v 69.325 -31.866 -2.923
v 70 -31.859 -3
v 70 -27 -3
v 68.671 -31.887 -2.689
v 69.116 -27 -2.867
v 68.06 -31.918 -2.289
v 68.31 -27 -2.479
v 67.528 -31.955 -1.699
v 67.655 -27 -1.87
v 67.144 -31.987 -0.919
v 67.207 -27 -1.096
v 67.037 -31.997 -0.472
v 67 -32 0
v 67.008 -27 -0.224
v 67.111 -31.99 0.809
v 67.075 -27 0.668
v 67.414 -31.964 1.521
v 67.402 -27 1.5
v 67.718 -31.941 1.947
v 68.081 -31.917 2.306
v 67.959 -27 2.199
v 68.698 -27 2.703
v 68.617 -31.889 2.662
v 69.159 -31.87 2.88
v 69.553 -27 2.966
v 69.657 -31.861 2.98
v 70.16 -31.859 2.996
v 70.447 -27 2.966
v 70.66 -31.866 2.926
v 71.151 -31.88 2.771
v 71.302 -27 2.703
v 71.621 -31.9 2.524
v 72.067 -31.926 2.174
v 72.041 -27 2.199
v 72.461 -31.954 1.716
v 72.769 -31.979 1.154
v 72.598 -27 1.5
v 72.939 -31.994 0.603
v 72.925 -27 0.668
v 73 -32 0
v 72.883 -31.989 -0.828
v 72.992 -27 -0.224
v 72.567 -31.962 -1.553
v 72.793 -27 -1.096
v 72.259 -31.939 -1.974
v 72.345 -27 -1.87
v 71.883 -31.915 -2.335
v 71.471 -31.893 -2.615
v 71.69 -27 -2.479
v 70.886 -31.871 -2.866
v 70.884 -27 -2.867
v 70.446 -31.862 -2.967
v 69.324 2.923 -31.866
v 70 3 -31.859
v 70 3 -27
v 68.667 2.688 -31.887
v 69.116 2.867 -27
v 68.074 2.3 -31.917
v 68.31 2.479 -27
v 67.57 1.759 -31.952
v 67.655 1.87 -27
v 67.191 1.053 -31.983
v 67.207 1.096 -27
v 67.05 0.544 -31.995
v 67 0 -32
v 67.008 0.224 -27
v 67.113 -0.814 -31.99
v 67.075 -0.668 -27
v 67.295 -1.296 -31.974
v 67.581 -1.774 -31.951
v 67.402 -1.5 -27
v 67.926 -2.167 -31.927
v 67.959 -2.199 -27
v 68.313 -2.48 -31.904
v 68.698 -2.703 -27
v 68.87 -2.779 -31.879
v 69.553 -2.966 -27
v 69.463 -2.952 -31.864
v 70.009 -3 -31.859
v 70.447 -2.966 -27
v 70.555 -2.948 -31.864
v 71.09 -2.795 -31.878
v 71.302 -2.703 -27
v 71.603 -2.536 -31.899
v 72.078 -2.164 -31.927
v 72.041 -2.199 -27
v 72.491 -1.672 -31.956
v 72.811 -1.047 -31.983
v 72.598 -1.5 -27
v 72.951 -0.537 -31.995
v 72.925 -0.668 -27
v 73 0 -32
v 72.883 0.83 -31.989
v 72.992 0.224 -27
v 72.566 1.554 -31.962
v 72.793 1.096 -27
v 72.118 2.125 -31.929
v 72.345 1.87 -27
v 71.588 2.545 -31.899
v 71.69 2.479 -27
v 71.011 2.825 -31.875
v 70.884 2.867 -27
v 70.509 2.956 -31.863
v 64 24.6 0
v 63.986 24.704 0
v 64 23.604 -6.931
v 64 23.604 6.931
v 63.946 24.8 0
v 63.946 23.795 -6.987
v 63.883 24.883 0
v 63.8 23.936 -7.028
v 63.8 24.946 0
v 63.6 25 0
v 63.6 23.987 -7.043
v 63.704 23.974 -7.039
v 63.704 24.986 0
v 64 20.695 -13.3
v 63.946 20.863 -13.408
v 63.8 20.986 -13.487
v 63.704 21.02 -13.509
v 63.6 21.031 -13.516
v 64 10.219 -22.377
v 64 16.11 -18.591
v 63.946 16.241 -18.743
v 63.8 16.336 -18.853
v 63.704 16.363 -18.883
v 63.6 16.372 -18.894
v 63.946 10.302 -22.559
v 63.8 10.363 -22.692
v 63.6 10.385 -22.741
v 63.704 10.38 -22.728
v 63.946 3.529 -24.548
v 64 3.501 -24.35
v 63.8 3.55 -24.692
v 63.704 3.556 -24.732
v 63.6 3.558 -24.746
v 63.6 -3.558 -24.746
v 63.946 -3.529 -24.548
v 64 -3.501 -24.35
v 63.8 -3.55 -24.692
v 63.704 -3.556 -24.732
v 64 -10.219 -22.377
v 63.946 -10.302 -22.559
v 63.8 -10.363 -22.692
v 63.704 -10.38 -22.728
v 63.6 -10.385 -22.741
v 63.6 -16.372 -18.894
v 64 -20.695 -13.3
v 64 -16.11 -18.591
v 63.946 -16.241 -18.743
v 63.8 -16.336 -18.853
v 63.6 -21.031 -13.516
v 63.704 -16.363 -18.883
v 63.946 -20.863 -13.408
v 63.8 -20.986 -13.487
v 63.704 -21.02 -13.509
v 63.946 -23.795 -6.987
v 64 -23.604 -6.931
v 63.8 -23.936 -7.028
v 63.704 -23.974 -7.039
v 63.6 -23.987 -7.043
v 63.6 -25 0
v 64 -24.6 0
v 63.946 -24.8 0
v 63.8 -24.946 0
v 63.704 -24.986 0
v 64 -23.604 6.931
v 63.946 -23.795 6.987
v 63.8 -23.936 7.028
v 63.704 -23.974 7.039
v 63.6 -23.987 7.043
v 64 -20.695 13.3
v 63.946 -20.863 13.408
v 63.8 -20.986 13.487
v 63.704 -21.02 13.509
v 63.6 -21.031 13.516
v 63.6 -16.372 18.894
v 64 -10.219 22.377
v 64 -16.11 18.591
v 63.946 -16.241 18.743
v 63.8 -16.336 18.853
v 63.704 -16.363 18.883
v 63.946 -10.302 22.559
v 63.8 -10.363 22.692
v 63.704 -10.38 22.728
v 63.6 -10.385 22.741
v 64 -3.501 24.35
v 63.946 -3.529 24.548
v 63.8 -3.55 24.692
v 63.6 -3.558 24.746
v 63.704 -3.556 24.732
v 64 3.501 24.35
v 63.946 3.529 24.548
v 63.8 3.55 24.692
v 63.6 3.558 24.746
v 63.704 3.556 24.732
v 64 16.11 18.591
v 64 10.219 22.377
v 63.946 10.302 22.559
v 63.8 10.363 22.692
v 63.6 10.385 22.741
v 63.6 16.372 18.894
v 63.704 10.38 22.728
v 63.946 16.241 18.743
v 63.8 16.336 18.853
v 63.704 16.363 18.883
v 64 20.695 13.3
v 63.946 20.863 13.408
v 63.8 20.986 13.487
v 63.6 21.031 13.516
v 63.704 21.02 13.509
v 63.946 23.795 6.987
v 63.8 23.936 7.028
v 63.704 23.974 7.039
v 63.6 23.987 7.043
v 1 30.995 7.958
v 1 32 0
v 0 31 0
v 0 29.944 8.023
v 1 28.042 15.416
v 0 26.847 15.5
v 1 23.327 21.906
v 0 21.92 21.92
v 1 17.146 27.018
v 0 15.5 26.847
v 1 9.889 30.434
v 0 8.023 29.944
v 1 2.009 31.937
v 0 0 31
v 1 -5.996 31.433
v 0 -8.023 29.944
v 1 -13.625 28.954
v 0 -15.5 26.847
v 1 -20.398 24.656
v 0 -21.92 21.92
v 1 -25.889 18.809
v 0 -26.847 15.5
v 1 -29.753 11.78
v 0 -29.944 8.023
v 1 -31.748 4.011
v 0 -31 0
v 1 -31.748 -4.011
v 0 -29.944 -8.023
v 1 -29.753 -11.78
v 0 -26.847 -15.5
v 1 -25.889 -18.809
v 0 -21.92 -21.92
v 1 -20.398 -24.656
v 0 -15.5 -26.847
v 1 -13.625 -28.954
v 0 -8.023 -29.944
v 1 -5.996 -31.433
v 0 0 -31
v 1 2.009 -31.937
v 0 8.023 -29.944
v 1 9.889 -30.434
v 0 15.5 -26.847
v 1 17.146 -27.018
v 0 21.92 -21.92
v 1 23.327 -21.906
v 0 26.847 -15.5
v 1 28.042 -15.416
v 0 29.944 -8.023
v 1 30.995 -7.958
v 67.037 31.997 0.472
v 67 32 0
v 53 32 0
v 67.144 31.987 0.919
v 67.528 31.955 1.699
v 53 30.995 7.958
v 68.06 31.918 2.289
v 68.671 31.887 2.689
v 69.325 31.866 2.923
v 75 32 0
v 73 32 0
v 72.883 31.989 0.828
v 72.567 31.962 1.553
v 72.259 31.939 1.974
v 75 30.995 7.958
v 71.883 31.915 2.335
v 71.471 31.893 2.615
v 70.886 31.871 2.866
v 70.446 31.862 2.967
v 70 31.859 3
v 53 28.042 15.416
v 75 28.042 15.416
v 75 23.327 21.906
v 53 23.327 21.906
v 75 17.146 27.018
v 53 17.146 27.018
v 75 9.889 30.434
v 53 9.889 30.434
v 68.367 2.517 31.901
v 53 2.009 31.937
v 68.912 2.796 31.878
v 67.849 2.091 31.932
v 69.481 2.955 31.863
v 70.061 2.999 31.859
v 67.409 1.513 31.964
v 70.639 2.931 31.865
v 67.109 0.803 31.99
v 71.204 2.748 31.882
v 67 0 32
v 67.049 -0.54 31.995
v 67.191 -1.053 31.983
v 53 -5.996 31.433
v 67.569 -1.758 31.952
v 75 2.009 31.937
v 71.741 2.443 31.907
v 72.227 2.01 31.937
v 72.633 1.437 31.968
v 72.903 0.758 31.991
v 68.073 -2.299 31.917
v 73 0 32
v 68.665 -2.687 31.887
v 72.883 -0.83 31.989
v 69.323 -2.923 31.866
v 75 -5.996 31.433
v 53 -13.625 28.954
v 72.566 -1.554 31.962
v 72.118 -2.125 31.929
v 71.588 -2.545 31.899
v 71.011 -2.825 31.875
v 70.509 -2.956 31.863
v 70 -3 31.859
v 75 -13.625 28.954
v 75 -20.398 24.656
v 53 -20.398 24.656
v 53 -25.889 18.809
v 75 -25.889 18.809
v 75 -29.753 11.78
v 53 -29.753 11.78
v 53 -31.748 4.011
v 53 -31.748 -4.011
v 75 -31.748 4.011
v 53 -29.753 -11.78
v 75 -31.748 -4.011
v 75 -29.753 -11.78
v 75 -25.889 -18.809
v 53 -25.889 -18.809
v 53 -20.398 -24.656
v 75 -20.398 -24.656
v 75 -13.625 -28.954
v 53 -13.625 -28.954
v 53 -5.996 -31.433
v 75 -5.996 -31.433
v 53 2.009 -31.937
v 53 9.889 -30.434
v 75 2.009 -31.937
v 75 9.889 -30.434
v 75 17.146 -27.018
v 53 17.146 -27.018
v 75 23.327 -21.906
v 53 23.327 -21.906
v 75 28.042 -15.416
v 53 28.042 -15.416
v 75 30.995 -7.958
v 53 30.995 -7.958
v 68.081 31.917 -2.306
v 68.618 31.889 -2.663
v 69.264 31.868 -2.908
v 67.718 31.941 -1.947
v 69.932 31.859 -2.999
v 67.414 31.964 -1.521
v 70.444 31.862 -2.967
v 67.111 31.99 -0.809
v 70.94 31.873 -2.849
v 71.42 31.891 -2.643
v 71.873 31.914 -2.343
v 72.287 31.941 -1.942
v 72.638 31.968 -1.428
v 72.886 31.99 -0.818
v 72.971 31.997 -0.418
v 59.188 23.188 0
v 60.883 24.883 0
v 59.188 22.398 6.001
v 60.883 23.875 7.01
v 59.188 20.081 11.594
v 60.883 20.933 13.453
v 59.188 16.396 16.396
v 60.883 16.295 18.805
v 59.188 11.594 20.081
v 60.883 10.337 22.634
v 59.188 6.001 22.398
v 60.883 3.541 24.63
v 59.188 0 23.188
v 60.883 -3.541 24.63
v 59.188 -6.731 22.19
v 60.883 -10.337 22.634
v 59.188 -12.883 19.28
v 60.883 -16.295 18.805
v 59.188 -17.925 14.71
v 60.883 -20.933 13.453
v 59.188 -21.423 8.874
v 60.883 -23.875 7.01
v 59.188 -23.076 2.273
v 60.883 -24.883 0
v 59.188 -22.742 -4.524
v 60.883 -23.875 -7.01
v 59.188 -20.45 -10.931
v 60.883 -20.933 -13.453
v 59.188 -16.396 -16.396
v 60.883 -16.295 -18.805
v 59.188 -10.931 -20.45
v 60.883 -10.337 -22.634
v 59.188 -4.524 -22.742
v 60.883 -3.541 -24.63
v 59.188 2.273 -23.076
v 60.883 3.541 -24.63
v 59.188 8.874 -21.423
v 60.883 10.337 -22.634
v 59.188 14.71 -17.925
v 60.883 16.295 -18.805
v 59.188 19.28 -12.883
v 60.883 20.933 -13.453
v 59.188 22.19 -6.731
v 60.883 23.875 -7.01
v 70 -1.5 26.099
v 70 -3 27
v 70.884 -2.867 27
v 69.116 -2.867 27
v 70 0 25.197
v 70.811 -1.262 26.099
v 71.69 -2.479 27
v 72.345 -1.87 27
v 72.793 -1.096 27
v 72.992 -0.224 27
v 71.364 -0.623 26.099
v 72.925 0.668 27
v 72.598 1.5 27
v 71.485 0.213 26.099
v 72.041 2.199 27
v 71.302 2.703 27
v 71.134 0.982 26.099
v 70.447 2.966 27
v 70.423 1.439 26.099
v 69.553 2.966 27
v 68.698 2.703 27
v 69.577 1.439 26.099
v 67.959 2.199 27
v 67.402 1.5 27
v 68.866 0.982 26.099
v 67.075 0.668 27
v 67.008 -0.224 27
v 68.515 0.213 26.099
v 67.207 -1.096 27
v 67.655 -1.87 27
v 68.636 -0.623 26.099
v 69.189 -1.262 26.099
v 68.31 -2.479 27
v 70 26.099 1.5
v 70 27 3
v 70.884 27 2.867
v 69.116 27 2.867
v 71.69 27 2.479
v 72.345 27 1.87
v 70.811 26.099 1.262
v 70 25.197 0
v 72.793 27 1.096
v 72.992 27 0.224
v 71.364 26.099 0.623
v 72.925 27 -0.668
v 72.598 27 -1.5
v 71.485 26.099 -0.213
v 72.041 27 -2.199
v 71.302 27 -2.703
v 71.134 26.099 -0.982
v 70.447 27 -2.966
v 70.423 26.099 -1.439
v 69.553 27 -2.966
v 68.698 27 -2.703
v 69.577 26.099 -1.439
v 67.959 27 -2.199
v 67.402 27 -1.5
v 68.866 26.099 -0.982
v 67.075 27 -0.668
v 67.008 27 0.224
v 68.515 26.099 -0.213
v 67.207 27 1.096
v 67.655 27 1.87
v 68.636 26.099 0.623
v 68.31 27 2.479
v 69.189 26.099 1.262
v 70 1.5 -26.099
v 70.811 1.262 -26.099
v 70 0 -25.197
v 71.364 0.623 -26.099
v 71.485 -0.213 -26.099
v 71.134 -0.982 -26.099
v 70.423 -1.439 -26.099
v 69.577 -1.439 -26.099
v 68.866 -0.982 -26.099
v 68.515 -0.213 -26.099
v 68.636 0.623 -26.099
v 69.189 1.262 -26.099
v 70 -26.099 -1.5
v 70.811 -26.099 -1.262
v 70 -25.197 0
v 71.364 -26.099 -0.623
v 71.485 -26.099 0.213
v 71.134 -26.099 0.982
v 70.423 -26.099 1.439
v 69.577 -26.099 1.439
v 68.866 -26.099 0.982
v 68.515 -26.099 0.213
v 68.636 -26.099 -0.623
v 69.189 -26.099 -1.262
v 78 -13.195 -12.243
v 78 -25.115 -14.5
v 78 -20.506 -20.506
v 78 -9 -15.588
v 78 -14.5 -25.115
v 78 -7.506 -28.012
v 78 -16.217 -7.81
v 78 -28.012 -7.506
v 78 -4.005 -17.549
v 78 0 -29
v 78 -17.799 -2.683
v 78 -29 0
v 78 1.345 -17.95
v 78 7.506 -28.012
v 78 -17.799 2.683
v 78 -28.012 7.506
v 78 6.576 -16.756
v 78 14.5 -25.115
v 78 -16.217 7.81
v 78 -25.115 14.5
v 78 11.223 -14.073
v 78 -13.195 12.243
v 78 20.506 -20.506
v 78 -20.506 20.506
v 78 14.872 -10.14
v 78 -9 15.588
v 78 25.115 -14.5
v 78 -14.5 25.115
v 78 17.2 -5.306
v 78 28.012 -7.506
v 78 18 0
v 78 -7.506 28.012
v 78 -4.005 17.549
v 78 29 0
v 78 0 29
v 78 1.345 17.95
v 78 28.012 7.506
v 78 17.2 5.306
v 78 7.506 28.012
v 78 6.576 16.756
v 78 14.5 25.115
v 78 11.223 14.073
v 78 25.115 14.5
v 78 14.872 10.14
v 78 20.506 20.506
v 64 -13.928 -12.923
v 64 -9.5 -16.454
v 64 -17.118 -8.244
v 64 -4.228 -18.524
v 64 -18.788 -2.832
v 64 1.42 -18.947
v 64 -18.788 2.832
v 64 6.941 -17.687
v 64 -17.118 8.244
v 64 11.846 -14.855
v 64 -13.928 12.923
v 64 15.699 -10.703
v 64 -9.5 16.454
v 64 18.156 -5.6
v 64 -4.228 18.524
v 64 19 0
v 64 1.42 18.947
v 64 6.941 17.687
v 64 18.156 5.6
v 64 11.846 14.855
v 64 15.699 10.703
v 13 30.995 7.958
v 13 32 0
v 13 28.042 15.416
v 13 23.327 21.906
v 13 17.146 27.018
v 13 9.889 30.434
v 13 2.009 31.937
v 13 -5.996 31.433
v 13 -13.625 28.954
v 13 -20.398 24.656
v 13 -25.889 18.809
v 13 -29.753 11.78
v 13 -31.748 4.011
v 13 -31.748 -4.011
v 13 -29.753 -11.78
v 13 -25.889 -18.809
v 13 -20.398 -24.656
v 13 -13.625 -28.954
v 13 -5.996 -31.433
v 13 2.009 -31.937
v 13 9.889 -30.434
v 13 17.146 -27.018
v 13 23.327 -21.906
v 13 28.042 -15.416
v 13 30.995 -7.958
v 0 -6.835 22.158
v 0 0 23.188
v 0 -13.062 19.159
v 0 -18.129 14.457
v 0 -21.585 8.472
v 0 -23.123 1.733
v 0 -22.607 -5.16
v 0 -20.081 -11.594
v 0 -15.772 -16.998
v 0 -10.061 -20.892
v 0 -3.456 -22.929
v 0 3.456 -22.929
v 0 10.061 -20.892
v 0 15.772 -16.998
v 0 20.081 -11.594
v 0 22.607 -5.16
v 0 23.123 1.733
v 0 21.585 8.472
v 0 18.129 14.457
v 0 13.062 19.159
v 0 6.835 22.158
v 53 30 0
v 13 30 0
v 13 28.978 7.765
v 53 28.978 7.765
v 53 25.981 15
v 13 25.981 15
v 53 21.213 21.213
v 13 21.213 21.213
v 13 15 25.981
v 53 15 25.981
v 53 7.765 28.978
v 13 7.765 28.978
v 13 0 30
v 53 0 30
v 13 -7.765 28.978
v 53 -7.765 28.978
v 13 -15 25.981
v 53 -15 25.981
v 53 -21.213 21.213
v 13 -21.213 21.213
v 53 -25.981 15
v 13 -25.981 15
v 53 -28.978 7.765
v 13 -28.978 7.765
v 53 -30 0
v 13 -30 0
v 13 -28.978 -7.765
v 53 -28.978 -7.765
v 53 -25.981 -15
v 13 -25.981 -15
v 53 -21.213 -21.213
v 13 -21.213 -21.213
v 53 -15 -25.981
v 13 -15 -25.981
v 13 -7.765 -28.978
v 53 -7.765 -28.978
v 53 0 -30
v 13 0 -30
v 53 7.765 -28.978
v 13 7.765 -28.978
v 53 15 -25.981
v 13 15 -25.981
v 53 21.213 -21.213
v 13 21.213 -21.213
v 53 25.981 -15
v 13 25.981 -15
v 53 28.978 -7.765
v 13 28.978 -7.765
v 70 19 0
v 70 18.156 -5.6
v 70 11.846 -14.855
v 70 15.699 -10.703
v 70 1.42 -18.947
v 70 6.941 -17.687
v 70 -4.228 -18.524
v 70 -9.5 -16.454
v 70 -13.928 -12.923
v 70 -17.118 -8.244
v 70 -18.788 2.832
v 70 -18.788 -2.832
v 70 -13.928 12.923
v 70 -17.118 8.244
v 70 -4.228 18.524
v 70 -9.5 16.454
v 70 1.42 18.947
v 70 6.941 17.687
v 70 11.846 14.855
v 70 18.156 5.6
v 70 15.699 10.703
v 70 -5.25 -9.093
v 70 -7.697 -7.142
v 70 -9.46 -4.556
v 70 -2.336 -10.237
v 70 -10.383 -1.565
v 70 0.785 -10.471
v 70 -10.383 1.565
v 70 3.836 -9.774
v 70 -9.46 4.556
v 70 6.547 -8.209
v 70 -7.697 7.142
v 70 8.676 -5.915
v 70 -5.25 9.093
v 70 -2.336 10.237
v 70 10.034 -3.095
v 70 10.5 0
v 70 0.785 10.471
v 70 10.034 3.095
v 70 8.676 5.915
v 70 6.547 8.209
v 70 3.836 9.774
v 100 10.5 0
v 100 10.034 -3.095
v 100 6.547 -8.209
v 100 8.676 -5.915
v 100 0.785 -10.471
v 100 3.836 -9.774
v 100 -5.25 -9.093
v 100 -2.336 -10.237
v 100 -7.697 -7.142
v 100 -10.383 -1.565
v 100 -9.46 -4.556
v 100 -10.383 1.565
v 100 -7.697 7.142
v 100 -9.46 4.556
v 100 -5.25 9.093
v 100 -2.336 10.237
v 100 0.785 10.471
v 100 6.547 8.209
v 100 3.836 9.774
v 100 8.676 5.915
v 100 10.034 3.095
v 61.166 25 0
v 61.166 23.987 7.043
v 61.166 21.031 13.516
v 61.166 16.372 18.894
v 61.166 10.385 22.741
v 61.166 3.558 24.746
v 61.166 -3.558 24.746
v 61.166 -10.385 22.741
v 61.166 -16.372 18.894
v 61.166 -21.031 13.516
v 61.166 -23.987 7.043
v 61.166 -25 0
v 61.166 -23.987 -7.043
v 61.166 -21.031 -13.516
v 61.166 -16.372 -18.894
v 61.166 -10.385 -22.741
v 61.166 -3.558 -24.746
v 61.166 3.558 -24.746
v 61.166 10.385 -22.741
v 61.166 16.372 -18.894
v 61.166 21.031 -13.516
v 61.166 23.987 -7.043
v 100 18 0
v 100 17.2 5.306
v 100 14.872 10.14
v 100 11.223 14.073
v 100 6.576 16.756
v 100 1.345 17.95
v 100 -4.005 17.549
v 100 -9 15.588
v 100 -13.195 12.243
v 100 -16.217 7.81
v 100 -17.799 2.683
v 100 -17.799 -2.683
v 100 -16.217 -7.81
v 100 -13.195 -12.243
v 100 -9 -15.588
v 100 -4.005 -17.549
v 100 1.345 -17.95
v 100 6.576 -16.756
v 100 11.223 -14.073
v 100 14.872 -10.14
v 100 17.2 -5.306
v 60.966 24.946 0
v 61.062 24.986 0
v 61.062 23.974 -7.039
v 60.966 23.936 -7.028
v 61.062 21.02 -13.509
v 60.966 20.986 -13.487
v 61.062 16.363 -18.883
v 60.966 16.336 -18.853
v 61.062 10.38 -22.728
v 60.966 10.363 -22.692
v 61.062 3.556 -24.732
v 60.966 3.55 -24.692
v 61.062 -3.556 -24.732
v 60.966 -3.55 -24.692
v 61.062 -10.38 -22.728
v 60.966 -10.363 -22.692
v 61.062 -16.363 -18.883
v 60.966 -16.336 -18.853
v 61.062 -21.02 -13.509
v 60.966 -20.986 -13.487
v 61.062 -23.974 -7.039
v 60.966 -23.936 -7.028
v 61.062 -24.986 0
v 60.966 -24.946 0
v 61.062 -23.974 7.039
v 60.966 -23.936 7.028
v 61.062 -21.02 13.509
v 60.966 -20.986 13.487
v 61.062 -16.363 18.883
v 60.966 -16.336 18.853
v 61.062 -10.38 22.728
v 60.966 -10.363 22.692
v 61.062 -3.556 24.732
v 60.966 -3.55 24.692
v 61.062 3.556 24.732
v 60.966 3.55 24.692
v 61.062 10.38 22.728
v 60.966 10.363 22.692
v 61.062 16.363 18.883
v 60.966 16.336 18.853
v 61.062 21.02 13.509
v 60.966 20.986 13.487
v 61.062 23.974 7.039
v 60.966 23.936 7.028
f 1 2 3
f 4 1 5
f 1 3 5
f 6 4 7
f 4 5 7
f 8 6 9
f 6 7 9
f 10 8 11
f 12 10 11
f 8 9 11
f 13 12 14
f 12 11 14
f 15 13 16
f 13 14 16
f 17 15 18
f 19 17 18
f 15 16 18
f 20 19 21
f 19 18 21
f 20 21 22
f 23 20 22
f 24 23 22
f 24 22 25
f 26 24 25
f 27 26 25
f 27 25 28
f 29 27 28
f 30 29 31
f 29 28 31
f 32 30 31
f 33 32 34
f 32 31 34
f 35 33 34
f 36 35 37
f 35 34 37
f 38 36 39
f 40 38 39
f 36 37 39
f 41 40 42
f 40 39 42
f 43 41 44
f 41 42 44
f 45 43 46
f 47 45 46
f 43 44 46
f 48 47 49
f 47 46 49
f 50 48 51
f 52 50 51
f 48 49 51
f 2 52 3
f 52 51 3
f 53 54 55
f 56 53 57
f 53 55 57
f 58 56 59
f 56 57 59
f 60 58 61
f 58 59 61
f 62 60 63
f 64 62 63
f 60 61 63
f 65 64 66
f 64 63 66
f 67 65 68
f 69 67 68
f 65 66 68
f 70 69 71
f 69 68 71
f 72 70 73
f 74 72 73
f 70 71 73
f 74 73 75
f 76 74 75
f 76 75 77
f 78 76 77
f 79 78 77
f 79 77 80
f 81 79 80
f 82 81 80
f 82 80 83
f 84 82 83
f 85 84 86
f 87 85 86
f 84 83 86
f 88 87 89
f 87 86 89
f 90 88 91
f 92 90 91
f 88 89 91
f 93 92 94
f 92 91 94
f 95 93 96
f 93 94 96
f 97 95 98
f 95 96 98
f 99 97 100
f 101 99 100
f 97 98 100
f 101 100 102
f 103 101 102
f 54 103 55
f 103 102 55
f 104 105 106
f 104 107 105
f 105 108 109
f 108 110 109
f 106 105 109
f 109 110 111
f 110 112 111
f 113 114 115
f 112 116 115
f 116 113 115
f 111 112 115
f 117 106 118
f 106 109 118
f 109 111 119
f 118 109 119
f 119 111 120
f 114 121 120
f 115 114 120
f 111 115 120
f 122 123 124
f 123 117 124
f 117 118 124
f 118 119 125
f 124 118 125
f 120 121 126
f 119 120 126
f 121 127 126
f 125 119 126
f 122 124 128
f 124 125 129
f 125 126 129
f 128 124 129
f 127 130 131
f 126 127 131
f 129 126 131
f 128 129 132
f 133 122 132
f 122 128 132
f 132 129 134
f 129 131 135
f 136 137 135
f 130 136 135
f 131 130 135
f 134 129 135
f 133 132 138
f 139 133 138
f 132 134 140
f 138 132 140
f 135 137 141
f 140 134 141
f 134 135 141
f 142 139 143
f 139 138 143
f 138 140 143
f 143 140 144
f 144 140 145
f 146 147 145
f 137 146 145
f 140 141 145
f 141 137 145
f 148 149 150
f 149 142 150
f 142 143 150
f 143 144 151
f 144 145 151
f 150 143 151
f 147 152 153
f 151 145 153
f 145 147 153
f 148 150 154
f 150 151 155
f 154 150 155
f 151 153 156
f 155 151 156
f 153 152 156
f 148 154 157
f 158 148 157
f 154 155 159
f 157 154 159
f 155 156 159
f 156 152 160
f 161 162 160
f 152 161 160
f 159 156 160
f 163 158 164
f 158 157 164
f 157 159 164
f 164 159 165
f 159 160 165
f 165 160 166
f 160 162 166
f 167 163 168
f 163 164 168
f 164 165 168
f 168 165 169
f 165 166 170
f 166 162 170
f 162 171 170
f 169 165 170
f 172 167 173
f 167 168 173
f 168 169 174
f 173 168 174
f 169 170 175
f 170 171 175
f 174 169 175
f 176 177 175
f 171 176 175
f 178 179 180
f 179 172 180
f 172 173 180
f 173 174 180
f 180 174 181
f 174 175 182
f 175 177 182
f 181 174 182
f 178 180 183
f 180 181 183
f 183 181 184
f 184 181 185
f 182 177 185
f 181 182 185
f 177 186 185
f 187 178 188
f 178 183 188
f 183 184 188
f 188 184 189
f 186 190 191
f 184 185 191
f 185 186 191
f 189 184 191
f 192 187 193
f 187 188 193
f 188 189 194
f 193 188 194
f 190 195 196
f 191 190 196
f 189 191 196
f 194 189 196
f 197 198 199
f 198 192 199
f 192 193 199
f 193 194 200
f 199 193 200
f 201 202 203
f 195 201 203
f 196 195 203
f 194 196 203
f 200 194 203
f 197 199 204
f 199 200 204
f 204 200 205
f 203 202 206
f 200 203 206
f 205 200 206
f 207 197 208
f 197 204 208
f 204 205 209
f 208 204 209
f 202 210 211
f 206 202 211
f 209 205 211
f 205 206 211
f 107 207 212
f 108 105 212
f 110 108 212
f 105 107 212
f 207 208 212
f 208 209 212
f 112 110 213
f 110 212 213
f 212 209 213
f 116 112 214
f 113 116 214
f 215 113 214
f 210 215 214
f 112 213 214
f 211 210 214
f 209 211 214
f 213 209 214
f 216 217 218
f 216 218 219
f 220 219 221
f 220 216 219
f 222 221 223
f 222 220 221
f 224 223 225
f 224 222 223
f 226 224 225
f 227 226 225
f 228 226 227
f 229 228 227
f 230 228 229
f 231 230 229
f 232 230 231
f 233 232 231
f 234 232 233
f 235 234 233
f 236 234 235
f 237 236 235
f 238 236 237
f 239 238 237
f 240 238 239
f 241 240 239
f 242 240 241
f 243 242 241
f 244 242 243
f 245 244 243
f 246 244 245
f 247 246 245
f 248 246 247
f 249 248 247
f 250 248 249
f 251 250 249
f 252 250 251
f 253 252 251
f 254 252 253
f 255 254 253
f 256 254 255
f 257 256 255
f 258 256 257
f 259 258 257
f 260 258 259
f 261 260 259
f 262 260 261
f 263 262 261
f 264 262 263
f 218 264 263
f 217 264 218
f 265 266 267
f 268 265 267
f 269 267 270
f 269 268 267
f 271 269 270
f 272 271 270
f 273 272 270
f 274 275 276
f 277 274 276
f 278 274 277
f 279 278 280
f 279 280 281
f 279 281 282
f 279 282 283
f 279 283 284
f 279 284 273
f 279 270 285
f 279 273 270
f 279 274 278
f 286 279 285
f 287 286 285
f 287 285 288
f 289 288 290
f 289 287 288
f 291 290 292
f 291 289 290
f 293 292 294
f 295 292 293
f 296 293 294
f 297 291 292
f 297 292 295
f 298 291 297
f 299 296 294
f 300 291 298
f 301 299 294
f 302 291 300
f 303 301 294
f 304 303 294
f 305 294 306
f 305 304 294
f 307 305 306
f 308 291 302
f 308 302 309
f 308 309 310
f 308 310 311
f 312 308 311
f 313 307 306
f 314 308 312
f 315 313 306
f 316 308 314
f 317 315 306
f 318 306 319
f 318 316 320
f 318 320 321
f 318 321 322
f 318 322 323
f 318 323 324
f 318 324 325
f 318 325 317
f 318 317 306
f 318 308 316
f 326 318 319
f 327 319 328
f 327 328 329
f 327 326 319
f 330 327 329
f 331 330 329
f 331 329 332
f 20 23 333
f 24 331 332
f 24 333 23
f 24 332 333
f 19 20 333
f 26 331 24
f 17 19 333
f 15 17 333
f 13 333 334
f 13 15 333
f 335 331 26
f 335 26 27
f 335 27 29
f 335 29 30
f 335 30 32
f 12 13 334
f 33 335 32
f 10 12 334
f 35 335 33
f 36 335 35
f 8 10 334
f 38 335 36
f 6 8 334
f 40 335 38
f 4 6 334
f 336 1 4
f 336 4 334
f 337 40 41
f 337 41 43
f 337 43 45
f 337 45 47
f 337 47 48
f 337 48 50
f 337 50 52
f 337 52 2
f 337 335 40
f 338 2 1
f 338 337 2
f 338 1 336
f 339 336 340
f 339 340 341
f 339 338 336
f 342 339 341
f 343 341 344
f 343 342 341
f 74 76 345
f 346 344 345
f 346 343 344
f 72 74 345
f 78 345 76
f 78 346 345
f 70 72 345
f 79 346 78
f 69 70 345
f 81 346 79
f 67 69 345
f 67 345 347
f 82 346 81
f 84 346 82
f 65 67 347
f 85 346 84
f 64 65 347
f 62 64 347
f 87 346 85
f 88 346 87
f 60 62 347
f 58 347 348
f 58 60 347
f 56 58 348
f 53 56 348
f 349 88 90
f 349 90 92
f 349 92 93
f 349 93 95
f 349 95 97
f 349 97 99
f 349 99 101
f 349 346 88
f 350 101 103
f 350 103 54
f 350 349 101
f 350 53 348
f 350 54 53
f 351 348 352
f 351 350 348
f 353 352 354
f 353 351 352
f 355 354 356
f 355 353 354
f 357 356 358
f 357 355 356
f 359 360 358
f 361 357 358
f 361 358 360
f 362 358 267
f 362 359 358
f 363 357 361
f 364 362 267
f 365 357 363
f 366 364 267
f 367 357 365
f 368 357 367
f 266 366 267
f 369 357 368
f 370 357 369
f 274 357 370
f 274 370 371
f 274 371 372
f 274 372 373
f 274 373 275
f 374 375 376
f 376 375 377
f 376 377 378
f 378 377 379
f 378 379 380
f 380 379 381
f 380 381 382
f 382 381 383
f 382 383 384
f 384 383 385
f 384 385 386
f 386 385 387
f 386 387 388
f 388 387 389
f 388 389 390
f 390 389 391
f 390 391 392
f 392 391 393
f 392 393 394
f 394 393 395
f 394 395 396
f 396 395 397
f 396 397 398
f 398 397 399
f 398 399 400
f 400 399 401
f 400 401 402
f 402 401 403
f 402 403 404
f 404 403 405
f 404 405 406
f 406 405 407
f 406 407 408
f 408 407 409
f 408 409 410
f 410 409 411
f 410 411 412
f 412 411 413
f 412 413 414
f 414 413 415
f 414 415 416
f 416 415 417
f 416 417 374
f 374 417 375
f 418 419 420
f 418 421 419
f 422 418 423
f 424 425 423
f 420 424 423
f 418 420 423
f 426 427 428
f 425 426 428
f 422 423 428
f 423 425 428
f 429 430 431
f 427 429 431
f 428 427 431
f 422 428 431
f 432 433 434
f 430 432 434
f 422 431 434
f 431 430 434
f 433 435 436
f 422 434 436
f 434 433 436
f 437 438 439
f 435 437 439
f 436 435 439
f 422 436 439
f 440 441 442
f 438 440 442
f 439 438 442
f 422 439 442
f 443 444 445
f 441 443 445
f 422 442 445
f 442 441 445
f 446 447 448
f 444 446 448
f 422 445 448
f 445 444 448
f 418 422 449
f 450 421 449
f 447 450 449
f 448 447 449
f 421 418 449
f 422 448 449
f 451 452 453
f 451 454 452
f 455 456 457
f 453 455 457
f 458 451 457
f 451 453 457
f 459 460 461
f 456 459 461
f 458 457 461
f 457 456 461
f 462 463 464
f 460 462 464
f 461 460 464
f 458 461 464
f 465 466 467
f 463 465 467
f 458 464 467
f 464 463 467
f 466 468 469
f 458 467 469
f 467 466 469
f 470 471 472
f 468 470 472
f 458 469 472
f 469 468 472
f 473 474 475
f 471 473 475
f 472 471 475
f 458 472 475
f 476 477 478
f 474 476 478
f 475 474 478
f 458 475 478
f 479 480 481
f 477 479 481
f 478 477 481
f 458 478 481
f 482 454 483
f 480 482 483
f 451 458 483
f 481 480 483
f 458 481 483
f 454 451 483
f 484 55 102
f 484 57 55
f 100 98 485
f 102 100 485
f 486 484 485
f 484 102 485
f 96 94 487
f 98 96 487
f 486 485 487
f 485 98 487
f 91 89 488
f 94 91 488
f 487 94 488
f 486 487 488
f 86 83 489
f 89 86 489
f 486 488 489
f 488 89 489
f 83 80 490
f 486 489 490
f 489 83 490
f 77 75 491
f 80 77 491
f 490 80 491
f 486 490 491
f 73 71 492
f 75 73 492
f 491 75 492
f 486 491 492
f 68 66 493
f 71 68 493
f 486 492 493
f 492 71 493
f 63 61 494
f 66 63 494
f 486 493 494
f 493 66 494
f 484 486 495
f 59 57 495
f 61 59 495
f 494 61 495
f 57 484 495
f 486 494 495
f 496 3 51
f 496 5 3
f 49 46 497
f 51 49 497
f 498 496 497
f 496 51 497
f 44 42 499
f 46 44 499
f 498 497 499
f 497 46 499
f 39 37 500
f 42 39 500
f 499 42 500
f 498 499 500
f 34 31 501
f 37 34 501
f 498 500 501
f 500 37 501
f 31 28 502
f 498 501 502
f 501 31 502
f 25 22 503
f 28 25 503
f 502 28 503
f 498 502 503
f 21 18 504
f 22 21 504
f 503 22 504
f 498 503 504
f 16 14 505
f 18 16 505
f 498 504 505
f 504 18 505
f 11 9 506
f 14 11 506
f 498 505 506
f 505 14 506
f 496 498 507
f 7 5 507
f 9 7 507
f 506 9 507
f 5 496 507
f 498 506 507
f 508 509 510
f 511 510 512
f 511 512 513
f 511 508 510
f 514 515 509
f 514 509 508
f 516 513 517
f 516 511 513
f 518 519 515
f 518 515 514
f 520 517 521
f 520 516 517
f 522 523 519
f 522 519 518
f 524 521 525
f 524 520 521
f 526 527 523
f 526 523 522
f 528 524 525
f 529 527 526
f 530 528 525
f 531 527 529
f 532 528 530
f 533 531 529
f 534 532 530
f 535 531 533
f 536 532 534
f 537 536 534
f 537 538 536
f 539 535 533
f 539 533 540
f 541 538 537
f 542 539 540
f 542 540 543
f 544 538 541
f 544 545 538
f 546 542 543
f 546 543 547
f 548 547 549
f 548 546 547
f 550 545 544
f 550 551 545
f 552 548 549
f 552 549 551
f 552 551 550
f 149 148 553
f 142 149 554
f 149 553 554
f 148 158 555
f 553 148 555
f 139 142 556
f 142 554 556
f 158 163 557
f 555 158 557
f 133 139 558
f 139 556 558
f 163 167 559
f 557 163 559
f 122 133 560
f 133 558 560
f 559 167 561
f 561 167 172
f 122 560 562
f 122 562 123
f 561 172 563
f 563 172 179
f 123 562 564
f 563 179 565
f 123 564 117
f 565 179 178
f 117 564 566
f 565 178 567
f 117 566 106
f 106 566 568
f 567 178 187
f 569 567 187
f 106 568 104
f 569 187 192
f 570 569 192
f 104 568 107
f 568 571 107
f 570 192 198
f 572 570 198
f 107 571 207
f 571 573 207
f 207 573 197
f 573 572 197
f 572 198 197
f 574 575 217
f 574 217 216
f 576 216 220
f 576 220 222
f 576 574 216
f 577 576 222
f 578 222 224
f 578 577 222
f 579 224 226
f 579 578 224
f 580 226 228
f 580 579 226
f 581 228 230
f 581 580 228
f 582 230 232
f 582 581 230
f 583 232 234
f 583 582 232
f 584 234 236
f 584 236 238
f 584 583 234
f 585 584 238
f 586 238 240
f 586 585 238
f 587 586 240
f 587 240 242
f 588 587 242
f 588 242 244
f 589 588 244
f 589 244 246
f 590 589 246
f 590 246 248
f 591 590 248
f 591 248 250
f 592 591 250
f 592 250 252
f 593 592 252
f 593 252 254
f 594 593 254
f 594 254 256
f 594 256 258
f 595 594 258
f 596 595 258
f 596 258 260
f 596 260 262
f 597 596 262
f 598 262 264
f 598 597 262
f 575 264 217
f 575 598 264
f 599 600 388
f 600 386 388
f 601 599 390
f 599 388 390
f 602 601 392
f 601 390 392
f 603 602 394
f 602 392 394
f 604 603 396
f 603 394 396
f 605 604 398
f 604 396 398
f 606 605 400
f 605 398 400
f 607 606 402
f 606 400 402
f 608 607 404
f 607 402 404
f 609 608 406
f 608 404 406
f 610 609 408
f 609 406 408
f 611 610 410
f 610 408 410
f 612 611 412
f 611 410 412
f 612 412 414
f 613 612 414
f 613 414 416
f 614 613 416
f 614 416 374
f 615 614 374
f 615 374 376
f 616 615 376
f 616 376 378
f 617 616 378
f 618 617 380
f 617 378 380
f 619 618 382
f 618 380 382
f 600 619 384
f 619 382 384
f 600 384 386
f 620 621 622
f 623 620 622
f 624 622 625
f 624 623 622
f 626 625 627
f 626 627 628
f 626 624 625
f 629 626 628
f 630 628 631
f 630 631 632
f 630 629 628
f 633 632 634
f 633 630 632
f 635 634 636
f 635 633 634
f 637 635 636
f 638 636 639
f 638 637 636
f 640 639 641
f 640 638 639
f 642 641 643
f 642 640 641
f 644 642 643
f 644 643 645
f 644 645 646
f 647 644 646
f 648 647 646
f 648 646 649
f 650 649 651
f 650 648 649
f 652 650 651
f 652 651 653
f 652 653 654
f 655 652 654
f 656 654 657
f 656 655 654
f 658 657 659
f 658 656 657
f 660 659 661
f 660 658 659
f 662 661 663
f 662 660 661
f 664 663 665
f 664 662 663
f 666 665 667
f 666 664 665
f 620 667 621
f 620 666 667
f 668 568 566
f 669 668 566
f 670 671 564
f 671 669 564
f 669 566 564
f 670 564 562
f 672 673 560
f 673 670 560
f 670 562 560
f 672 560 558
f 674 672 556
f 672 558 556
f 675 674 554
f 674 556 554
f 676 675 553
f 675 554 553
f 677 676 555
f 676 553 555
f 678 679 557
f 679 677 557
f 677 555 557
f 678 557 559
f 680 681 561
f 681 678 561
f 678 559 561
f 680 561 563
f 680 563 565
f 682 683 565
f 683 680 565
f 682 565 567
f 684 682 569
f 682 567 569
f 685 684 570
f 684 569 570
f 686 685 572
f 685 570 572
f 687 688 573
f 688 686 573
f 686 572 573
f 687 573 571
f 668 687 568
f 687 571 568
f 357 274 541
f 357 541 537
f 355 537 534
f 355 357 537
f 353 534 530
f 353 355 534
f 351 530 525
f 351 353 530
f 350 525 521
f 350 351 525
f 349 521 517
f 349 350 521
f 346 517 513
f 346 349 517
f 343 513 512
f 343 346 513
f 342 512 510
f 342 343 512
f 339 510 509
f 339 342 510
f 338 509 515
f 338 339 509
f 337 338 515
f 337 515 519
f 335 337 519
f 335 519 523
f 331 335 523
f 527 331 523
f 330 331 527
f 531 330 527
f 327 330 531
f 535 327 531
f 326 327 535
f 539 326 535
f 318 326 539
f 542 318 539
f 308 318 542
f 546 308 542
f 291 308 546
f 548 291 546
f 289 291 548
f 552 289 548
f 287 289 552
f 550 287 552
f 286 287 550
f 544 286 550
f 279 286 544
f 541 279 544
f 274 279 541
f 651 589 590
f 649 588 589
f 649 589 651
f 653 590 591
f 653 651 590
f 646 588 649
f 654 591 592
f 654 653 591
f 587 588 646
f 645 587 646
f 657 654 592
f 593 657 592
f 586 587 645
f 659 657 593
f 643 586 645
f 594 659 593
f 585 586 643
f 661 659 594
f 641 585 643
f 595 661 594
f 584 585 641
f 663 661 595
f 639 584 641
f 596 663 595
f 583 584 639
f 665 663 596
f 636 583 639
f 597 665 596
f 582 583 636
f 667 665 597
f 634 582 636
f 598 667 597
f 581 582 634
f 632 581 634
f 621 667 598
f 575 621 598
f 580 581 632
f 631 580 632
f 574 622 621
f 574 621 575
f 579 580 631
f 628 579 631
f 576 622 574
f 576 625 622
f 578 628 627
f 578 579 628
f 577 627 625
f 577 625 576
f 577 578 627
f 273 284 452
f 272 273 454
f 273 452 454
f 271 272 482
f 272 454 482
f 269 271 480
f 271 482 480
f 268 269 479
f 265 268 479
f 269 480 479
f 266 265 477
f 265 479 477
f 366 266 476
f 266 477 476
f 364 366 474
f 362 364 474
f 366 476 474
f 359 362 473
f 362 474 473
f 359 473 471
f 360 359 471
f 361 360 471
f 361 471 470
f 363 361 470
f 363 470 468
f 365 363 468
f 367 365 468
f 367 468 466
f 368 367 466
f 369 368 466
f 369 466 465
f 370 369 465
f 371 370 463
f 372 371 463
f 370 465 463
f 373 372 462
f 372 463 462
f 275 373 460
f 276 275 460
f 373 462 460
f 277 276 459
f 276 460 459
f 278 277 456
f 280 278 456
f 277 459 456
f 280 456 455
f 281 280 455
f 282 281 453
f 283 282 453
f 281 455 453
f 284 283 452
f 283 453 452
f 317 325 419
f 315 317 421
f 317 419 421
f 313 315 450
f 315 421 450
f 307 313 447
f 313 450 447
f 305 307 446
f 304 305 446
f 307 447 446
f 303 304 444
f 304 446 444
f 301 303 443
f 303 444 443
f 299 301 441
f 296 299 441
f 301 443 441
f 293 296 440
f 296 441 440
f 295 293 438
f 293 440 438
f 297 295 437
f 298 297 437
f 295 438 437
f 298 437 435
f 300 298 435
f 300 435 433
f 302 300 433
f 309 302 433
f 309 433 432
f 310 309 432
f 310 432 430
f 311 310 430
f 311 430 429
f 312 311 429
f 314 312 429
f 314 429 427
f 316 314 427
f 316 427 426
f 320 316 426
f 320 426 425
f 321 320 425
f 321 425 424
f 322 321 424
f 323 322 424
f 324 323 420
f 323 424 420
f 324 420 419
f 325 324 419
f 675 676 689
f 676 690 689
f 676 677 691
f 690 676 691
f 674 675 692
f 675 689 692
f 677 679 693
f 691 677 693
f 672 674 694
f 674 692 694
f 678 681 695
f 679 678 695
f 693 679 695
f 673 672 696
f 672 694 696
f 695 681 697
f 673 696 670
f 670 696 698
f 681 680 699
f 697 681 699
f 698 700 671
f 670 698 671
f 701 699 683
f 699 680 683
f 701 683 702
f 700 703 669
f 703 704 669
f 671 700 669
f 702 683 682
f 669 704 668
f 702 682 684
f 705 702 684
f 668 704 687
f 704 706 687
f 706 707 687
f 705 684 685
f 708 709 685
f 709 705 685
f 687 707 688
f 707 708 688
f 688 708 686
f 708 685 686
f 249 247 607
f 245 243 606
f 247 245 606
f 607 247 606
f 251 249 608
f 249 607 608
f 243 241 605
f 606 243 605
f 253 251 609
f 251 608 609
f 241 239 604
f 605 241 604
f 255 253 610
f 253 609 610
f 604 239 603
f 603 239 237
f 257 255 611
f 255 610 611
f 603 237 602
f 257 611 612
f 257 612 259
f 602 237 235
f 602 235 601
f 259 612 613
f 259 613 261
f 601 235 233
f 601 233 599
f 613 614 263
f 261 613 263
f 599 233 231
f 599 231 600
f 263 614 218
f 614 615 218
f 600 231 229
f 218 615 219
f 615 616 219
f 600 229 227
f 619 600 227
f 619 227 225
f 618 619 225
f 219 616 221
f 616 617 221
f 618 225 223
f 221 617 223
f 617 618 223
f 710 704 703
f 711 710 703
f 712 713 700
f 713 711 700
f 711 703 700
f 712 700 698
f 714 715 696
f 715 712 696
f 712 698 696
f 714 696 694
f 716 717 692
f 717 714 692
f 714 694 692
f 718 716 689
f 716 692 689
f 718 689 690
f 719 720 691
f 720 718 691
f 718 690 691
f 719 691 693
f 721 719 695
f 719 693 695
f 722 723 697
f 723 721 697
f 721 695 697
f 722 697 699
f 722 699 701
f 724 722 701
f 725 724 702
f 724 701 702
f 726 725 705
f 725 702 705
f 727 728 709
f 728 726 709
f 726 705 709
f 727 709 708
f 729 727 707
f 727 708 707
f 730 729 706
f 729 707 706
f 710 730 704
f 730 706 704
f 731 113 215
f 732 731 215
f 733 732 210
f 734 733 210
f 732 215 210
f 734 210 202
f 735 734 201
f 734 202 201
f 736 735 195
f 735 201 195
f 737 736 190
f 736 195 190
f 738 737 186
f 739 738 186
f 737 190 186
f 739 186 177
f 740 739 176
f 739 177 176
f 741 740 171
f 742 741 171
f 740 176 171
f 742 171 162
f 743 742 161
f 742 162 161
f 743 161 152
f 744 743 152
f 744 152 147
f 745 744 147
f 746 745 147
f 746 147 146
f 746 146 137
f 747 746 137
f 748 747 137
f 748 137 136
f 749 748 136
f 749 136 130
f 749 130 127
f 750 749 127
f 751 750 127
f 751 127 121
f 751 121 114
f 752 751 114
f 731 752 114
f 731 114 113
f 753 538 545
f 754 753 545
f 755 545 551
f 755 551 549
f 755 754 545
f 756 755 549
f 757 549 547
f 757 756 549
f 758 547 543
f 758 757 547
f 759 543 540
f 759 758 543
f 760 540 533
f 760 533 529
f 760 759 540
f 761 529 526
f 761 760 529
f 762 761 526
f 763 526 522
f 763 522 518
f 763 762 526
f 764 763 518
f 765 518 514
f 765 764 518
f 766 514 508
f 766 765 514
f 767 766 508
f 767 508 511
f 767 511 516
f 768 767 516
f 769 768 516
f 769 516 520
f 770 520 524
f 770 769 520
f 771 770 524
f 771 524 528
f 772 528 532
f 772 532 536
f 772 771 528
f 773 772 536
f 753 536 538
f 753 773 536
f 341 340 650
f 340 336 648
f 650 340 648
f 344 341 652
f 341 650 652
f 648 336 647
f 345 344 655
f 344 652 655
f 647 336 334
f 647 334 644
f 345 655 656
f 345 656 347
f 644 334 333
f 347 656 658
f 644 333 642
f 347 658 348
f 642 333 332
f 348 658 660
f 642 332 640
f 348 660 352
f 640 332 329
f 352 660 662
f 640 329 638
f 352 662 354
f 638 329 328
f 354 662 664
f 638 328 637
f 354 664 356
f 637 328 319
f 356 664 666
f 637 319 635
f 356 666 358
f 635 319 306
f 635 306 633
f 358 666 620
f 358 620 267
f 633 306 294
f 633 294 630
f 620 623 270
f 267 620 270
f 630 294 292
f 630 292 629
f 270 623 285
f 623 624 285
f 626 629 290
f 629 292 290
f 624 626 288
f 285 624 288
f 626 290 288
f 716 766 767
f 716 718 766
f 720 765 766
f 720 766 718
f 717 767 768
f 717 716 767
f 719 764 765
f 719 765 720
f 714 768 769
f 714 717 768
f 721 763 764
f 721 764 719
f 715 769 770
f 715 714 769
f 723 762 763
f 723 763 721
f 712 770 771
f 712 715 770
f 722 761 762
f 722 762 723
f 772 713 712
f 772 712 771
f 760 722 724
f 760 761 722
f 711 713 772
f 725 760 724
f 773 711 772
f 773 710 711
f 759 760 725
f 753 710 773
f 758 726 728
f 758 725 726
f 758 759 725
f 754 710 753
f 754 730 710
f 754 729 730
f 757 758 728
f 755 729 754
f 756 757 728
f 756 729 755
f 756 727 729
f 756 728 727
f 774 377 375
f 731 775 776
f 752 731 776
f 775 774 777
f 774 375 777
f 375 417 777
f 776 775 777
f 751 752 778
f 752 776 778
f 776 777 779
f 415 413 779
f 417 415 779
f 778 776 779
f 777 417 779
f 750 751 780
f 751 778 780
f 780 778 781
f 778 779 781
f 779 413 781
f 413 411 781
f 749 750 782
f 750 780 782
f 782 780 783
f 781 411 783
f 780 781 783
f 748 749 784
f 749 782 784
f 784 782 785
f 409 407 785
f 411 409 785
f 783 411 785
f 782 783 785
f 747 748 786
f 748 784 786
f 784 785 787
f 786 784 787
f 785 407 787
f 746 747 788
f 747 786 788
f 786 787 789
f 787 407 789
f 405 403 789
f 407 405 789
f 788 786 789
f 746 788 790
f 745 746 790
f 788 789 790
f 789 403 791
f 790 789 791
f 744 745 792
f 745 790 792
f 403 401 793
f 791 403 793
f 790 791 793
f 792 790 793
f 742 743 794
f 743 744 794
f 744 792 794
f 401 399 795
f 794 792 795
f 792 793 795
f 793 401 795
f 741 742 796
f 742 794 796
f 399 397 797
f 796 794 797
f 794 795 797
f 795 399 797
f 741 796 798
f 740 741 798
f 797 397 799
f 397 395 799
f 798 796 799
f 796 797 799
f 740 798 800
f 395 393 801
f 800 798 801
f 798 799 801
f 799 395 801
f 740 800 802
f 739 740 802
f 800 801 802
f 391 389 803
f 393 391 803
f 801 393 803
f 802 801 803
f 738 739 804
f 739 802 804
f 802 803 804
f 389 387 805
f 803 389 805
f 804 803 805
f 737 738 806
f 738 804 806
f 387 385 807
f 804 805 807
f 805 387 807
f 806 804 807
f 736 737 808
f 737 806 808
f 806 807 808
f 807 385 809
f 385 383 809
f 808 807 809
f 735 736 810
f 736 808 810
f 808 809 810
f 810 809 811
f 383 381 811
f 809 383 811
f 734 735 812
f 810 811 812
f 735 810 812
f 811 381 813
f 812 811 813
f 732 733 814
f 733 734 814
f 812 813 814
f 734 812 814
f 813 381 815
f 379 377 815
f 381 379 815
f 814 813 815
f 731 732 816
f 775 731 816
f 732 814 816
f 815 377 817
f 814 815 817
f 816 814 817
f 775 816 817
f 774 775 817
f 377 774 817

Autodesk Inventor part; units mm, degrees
ref_plane "YZ Plane" through (0, 0, 0) normal (1, 0, 0) x (0, 1, 0)
ref_plane "XY Plane" through (0, 0, 0) normal (0, 0, 1) x (1, 0, 0)
sketch "Эскиз1" plane through (0, 0, 0) normal (0, 0, 1) x (1, 0, 0)
  line L0 (0, 0) -> (100, 0)
  line L1 (0, 20) -> (0, 32)
  line L2 (0, 32) -> (13, 32)
  line L3 (13, 32) -> (13, 30)
  line L4 (13, 30) -> (53, 30)
  line L5 (53, 30) -> (53, 32)
  line L6 (53, 32) -> (78, 32)
  line L7 (78, 32) -> (78, 18)
  line L8 (78, 18) -> (100, 18)
  line L9 (100, 18) -> (100, 10.5)
  line L10 (100, 10.5) -> (70, 10.5)
  line L11 (70, 10.5) -> (70, 19)
  line L12 (70, 19) -> (64, 19)
  line L13 (64, 19) -> (64, 24.6)
  line L14 (0, 20) -> (56, 20)
  line L15 (56, 20) -> (60.8828, 24.8828)
  line L16 (61.1657, 25) -> (63.6, 25)
  arc A0 (61.1657, 25) -> (60.8828, 24.8828) centre (61.1657, 24.6) ccw
  arc A1 (64, 24.6) -> (63.6, 25) centre (63.6, 24.6) ccw
  point P0 (64, 25)
  point P1 (61, 25)
  dimension "d2" = 100
  dimension "d3" = 40
  dimension "d4" = 25
  dimension "d5" = 22
  dimension "d6" = 21
  dimension "d7" = 36
  dimension "d11" = 38
  dimension "d12" = 6
  dimension "d13" = 64
  dimension "d14" = 64
  dimension "d15" = 60
  dimension "d16" = 45
  dimension "d18" = 3
  dimension "d19" = 0.4
  dimension "d20" = 50
  dimension "d21" = 40
revolve "Вращение1" add sketch "Эскиз1" angle 360 about axis through (0, 0, 0) along (1, 0, 0)
sketch "Эскиз2" plane through (0, 0, 0) normal (-1, 0, 0) x (0, 0, 1)
  circle A0 centre (0, 0) radius 32 projected
hole "Отверстие1" at (0, 0, 0) direction (1, 0, 0) diameter 46.376 depth 61 thread size "M48x1.5" class "6H" standard "ISO Metric profile"
ref_plane "РабПлоскость1" through (65.5, 32, 0) normal (0, 1, 0) x (-1, 0, 0)
sketch "Эскиз3" plane through (65.5, 32, 0) normal (0, 1, 0) x (-1, 0, 0)
  line L0 (-12.5, 32) -> (-12.5, -32) projected
  point P0 (65.5, 0)
  point P1 (-4.5, 0)
  dimension "d29" = 8
hole "Отверстие2" at (70, 32, 0) direction (0, -1, 0) diameter 6 depth 5 tip angle 118
pattern_circular "Круговой массив1" count 4 over 360 about axis through (65.5, 0, 0) along (1, 0, 0) of "Отверстие2"
chamfer "Фаска1" distance 3 angle 45 1 edges at (78, -32, 0)
chamfer "Фаска2" distance 1 angle 45 1 edges at (0, -32, 0)
properties part number "05.01.006" material "Чугун, серый"
